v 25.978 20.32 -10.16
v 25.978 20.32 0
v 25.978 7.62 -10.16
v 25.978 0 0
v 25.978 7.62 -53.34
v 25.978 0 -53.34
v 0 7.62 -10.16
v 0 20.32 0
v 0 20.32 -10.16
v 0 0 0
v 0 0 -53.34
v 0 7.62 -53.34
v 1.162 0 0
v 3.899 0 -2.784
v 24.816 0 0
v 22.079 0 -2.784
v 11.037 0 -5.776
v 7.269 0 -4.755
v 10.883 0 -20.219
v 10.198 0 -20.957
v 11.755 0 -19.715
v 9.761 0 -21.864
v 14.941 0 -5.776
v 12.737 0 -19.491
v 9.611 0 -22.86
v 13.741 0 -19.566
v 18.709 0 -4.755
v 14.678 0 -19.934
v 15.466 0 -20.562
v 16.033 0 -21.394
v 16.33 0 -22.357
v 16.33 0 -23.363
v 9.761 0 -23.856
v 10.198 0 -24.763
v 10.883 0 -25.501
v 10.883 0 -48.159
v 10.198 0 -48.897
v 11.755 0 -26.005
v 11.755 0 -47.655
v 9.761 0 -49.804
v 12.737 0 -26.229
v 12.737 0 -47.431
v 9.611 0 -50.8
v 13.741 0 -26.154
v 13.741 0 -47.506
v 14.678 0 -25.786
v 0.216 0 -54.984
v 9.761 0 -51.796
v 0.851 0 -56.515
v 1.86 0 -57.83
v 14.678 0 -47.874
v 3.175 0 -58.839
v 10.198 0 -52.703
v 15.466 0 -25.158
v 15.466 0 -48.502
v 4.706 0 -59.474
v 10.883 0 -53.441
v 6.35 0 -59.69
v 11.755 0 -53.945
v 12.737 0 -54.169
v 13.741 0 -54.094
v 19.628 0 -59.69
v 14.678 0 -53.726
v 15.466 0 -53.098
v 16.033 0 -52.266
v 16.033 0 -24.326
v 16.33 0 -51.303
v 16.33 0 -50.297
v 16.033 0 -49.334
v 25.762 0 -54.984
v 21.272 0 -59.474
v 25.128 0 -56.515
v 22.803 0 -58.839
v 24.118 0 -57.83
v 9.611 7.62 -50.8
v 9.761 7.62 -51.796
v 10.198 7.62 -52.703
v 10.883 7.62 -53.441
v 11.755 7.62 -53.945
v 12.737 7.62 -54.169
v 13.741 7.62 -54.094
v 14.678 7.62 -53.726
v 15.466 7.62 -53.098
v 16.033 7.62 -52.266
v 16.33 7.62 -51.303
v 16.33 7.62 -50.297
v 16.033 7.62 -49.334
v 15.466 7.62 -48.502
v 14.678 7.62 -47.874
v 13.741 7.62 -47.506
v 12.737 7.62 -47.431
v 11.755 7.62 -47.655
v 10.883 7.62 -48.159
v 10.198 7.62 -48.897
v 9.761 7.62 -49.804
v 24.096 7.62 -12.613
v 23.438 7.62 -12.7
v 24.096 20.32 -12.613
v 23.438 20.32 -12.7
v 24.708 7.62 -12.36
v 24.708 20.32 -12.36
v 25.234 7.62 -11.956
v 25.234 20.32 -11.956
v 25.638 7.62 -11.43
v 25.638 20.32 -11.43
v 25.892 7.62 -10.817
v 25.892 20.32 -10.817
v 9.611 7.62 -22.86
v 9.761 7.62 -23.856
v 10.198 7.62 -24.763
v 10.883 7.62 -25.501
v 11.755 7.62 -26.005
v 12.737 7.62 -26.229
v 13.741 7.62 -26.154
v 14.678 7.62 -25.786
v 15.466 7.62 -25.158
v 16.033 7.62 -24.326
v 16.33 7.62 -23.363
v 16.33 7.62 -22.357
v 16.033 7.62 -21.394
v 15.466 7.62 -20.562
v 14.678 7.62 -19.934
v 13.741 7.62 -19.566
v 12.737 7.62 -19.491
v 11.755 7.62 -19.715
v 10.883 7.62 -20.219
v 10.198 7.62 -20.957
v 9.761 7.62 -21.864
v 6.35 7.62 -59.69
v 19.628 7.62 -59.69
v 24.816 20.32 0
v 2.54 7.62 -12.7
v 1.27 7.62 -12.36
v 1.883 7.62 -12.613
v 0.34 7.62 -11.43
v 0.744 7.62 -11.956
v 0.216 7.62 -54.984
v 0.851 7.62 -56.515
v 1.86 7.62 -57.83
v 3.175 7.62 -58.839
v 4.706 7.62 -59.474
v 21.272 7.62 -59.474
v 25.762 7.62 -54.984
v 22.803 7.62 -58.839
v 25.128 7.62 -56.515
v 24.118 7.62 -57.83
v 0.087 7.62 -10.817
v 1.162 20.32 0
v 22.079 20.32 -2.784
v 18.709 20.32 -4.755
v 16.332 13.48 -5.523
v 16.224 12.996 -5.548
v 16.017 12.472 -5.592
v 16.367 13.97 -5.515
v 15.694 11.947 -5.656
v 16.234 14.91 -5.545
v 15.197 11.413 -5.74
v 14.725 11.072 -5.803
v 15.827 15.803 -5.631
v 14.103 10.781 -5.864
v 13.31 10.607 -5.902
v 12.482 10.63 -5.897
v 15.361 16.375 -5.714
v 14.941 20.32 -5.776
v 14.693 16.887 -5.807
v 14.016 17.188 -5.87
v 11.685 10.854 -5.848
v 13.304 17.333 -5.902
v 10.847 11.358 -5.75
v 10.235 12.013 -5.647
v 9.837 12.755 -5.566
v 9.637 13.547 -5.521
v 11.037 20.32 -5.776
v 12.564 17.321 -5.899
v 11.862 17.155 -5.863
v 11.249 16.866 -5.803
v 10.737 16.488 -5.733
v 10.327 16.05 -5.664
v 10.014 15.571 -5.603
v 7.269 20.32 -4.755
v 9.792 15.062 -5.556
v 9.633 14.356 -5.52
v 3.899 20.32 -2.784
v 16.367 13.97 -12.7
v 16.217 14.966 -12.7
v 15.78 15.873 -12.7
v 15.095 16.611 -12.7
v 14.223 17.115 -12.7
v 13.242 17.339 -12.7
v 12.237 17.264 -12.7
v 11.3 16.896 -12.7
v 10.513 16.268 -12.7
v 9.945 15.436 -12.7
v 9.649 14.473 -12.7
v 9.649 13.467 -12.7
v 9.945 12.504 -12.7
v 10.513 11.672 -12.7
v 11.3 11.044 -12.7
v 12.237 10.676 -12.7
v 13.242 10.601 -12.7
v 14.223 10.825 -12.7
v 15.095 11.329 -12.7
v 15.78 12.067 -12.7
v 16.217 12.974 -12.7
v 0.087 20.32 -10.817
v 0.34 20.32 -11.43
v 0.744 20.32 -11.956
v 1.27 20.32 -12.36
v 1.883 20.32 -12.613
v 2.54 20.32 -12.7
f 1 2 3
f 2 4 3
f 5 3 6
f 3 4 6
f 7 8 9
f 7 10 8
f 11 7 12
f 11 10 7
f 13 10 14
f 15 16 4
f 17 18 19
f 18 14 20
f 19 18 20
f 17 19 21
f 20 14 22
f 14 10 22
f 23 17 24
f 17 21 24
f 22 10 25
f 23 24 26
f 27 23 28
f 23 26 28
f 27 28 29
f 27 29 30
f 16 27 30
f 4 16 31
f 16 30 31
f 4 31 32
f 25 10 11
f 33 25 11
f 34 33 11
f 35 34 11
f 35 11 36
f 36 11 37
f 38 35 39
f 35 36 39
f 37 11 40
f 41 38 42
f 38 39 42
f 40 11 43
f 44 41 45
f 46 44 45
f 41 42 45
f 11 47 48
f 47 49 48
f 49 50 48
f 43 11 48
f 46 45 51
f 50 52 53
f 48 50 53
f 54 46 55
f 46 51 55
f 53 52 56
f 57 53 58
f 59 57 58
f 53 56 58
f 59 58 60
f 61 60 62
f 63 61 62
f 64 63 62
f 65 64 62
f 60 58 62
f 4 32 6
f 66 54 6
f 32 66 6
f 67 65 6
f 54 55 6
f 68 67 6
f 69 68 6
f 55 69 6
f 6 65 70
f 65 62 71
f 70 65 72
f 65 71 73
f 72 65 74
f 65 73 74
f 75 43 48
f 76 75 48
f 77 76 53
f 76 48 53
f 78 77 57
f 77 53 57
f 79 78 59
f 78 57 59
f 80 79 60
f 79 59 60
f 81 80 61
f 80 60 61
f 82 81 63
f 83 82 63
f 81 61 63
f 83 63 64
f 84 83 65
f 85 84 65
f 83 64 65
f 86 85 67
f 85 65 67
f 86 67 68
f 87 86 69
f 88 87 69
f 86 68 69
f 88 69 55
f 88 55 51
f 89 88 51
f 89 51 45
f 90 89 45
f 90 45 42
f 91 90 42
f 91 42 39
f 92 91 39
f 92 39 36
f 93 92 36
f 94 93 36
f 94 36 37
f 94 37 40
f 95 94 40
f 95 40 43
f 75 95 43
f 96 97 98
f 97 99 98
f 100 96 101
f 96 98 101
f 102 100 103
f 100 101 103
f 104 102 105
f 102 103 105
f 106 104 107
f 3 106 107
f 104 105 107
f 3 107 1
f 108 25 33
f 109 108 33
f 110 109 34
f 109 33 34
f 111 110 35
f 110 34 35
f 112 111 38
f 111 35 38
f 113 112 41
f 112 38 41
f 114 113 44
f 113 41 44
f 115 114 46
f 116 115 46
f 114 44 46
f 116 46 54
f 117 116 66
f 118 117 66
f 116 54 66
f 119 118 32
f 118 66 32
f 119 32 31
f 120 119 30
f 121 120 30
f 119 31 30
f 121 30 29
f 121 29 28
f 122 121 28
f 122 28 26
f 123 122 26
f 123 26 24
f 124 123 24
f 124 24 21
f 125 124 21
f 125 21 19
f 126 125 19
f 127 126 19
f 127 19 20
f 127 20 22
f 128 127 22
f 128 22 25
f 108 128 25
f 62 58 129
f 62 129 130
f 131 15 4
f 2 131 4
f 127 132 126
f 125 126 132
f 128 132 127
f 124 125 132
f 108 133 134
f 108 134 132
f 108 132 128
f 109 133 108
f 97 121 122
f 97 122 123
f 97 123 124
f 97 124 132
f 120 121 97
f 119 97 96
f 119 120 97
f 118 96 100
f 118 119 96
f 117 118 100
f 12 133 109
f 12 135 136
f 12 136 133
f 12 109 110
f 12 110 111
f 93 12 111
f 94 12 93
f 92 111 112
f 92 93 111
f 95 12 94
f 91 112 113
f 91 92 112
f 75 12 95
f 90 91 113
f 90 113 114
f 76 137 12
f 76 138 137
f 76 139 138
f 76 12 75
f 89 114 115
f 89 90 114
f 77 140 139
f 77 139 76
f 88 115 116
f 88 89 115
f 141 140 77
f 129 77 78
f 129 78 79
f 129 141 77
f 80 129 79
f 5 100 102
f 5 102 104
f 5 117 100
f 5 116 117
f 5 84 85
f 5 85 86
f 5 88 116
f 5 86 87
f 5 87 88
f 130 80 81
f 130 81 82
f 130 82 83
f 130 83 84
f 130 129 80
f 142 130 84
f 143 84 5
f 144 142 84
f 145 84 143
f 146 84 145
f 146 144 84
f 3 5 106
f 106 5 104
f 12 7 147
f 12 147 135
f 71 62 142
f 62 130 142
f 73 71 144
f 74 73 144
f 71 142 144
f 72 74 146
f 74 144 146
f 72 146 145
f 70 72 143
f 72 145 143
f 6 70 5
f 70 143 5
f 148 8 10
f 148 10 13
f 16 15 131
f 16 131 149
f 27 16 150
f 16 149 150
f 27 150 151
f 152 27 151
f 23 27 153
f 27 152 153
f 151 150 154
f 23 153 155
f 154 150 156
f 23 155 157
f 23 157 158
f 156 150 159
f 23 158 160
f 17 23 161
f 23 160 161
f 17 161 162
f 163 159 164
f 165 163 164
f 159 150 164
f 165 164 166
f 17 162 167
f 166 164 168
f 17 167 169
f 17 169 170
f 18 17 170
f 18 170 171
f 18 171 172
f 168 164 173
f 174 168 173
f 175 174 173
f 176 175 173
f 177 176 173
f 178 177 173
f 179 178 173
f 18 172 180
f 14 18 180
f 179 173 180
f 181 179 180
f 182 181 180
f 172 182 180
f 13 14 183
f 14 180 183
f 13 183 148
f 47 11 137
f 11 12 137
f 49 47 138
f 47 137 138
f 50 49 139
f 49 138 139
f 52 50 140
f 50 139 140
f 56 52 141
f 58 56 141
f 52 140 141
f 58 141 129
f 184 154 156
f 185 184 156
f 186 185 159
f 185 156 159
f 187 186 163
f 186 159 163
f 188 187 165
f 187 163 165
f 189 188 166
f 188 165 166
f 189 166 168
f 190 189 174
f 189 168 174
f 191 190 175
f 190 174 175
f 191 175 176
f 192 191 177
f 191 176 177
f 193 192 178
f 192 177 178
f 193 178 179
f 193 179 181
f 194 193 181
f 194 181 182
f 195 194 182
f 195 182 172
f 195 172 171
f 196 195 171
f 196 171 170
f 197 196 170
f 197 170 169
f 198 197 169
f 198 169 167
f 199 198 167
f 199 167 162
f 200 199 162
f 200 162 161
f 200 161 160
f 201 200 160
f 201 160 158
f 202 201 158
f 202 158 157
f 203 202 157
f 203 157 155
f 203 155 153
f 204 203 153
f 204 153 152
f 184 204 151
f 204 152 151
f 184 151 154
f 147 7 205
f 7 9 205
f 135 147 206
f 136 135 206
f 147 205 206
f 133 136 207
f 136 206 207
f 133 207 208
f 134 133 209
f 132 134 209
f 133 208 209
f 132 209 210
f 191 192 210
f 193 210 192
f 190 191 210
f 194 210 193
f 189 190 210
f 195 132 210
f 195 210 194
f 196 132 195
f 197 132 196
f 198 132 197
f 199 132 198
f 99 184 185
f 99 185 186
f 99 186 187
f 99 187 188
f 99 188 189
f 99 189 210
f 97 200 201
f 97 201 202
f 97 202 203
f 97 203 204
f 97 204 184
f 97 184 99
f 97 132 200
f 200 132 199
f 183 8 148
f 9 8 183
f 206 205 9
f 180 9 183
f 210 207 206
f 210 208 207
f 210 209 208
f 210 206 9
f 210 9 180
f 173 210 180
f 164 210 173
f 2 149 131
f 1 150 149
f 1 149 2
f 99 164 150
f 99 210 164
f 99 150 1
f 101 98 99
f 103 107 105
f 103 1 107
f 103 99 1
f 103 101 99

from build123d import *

# Parameters (mm, degrees)
SKETCH1_W                   = 25.978283713
SKETCH1_H                   = 59.69
BOSS_EXTRUDE1_DEPTH         = 7.62
SKETCH2_W                   = 25.978283713
SKETCH2_H                   = 12.7
BOSS_EXTRUDE2_DEPTH         = 12.7
SKETCH4_R                   = 14.7955
CUT_EXTRUDE1_DEPTH          = 20.32
F_1_4_CLEARANCE_HOLE1_D     = 6.7564
F_1_4_CLEARANCE_HOLE1_DEPTH = 7.62
FILLET1_R                   = 6.35
FILLET2_R                   = 2.54
F_1_4_CLEARANCE_HOLE2_D     = 6.7564


with BuildPart() as part:
    # Sketch1 → Boss-Extrude1 (new body)
    with BuildSketch(Plane(origin=(0, 0, 0), x_dir=(1, 0, 0), z_dir=(0, 1, 0))):
        with Locations((12.989141857, 29.845)):
            Rectangle(SKETCH1_W, SKETCH1_H)
    extrude(amount=BOSS_EXTRUDE1_DEPTH)

    # Sketch2 → Boss-Extrude2 (add)
    with BuildSketch(Plane(origin=(0, 7.62, 0), x_dir=(1, 0, 0), z_dir=(0, 1, 0))):
        with Locations((12.989141857, 6.35)):
            Rectangle(SKETCH2_W, SKETCH2_H)
    extrude(amount=BOSS_EXTRUDE2_DEPTH)

    # Sketch4 → Cut-Extrude1 (cut)
    with BuildSketch(Plane(origin=(0, 20.32, 0), x_dir=(1, 0, 0), z_dir=(0, 1, 0))):
        with Locations((12.989141856, -8.89)):
            Circle(SKETCH4_R)
    extrude(amount=-CUT_EXTRUDE1_DEPTH, mode=Mode.SUBTRACT)

    # 1/4 Clearance Hole1
    with Locations(Plane(origin=(0, 7.62, 0), x_dir=(1, 0, 0), z_dir=(0, 1, 0))):
        with Locations((12.989141856, 50.8), (12.989141856, 22.86)):
            Hole(F_1_4_CLEARANCE_HOLE1_D / 2, depth=F_1_4_CLEARANCE_HOLE1_DEPTH)

    # Fillet1
    fillet1_edges = [part.edges().sort_by_distance(p)[0] for p in [
        (0, 3.81, -59.69),
        (25.978283713, 3.81, -59.69),
    ]]
    fillet(fillet1_edges, radius=FILLET1_R)

    # Fillet2
    fillet2_edges = [part.edges().sort_by_distance(p)[0] for p in [
        (0, 13.97, -12.7),
        (25.978283713, 13.97, -12.7),
    ]]
    fillet(fillet2_edges, radius=FILLET2_R)

    # 1/4 Clearance Hole2 (through all)
    with Locations(Plane(origin=(0, 0, -12.7), x_dir=(-1, 0, 0), z_dir=(0, 0, -1))):
        with Locations((-12.989141856, 13.97)):
            Hole(F_1_4_CLEARANCE_HOLE2_D / 2)


solid = part.part
